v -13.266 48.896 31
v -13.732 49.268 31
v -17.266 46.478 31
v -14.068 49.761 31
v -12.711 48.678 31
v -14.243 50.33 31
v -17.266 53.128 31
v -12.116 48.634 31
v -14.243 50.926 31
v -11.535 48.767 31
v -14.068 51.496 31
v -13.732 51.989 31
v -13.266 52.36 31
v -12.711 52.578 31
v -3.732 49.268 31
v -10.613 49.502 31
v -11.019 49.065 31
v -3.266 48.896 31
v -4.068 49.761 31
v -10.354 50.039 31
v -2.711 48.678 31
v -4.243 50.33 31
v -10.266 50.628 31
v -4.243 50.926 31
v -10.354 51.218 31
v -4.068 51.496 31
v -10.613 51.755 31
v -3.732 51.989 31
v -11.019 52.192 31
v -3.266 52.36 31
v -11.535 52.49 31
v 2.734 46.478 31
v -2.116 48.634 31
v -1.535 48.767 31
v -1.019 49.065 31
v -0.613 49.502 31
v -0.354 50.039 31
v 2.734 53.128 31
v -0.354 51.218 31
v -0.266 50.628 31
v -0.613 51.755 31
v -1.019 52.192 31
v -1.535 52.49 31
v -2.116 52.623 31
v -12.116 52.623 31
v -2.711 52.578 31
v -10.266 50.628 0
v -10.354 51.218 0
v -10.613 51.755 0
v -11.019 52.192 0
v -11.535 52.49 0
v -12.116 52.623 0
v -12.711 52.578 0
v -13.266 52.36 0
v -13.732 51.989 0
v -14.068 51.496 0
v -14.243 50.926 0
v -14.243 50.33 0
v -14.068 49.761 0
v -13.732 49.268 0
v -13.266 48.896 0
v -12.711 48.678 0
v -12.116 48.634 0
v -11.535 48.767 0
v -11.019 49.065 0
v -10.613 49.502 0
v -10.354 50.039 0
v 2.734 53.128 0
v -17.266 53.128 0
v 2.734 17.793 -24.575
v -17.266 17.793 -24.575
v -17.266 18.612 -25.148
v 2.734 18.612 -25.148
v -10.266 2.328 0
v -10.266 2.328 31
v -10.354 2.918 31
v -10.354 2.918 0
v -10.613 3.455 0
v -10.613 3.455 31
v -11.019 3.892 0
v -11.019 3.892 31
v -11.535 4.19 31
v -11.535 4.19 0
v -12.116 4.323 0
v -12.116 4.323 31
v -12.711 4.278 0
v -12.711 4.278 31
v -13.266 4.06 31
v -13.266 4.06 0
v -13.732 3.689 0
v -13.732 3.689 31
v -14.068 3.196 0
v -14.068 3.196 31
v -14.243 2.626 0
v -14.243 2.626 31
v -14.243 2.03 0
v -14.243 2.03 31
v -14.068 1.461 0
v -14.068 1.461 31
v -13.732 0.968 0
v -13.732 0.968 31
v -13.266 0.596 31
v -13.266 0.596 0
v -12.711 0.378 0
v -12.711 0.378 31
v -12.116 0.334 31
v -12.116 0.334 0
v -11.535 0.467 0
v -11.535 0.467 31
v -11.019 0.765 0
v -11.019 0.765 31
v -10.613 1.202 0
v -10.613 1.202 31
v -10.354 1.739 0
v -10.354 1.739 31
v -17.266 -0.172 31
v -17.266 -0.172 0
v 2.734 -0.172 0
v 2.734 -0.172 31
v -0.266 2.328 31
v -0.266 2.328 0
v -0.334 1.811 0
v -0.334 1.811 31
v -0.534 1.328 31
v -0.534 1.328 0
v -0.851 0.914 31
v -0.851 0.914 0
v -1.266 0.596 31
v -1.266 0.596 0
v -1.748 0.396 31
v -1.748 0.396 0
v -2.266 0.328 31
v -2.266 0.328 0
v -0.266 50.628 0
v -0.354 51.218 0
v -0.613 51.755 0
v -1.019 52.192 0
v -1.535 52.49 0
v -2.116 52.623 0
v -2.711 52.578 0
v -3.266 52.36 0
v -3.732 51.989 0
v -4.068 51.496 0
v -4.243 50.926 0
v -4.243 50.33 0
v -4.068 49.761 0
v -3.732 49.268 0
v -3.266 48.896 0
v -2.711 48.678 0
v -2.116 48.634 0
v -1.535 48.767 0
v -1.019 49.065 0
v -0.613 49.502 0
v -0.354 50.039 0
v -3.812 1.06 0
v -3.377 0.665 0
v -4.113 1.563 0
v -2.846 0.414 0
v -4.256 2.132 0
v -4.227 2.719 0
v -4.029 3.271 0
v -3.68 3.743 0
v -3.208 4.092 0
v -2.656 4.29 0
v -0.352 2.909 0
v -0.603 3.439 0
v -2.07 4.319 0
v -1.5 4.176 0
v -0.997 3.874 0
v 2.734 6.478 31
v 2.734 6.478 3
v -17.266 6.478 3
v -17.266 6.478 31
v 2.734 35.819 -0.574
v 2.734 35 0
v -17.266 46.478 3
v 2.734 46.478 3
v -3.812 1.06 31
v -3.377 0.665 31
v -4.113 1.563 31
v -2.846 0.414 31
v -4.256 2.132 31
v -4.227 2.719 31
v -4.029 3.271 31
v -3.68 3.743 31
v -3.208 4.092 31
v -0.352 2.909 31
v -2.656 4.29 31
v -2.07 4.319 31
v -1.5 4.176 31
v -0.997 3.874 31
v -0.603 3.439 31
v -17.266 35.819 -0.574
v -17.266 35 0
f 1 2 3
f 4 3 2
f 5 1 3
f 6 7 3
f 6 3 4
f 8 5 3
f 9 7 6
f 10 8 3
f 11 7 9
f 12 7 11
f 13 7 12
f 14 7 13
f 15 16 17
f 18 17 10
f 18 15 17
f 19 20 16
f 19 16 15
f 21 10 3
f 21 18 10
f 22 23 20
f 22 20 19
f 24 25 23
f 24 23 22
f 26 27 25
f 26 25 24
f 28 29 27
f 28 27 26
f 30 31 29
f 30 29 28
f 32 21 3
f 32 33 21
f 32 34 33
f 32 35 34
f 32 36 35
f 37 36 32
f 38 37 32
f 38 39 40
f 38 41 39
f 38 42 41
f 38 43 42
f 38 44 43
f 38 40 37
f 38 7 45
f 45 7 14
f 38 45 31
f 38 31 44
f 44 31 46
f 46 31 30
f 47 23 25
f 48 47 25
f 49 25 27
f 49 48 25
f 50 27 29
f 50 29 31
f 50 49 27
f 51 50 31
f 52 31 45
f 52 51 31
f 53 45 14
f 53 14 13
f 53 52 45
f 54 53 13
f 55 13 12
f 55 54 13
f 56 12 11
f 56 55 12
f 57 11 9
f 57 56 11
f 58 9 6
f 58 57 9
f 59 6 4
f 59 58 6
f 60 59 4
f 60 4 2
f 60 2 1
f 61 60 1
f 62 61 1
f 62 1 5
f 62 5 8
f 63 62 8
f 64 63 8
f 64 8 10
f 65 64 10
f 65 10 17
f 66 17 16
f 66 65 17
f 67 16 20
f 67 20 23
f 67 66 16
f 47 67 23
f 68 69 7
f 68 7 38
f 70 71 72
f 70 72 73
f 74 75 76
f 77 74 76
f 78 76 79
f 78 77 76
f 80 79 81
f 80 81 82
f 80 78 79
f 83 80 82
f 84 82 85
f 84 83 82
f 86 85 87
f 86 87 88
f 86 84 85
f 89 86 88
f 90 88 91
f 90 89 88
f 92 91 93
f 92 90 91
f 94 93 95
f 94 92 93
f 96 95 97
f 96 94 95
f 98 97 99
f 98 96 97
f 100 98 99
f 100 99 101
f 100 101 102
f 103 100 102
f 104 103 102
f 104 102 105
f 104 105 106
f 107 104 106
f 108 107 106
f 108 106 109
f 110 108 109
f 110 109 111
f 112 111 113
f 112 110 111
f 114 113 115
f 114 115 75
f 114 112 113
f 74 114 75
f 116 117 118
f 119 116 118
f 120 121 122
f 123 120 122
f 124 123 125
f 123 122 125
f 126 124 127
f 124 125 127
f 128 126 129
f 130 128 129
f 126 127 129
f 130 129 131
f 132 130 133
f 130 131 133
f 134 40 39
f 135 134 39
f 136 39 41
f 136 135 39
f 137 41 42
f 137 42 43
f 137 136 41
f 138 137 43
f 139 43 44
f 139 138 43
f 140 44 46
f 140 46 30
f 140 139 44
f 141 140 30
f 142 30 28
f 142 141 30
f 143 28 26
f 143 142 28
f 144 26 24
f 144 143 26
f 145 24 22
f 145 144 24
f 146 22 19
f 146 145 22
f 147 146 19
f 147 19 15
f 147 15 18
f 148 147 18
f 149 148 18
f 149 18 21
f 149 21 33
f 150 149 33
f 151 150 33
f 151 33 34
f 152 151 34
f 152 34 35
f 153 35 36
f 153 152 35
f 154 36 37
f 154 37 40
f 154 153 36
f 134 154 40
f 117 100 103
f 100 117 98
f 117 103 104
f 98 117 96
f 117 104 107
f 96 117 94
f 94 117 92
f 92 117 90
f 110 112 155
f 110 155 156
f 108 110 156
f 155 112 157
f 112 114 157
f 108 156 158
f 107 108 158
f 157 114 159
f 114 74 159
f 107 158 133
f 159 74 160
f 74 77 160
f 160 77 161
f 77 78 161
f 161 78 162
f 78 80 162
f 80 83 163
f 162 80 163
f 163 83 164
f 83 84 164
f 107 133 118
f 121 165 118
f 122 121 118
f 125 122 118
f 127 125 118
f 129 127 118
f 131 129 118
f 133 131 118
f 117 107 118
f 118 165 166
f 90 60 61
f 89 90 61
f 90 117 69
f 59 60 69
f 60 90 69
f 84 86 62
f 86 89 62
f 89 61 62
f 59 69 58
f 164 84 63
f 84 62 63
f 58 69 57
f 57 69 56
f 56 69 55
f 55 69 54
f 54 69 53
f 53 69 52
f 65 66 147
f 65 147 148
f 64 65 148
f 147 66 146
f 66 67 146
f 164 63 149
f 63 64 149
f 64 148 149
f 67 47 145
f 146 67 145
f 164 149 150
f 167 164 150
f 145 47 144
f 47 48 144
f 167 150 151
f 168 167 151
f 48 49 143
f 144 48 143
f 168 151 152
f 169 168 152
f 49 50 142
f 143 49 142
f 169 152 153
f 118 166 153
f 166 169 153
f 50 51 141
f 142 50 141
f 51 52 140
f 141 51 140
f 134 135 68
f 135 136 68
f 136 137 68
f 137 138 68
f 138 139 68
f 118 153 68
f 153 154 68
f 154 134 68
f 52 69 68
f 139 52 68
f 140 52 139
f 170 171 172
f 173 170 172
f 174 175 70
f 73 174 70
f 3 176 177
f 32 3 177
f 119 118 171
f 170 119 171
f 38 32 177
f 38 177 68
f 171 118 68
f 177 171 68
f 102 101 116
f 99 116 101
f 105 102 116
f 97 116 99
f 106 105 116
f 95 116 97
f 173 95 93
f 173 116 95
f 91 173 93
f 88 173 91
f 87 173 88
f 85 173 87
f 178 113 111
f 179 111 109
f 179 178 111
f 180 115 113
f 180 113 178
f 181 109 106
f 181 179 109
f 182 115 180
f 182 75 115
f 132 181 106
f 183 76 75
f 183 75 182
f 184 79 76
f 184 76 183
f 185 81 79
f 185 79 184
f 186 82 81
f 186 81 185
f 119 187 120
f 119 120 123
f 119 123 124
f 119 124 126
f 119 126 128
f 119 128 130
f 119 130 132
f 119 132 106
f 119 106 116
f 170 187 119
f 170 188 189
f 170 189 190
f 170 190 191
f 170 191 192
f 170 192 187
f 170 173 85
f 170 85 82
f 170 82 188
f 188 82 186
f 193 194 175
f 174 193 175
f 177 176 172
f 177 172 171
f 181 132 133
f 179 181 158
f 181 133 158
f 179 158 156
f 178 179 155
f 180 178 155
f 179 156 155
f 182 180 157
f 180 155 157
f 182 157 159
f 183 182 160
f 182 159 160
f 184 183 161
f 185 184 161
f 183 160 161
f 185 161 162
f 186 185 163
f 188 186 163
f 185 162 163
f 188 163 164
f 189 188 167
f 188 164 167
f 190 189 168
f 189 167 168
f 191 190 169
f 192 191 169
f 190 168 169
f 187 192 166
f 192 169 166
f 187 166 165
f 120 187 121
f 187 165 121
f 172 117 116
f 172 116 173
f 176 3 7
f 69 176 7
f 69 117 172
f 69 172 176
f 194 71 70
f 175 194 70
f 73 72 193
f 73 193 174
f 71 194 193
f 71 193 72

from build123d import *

# Parameters (mm, degrees)
SKETCH3_W           = 20
SKETCH3_H           = 40
BOSS_EXTRUDE1_DEPTH = 3
SKETCH3_3_W         = 20
SKETCH3_3_H         = 6.65
SKETCH3_3_R         = 2
BOSS_EXTRUDE2_DEPTH = 31
SKETCH8_W           = 20
SKETCH8_H           = 30
BOSS_EXTRUDE6_DEPTH = 1


with BuildPart() as part:
    # Sketch3 → Boss-Extrude1 (new body)
    with BuildSketch(Plane.XY):
        with Locations((-7.265593176, 26.478335221)):
            Rectangle(SKETCH3_W, SKETCH3_H)
    extrude(amount=BOSS_EXTRUDE1_DEPTH)

    # Sketch3<3> → Boss-Extrude2 (add)
    # profile 1 of 2: a face of its own
    with BuildSketch(Plane.XY):
        with Locations((-7.265593176, 3.153335221)):
            Rectangle(SKETCH3_3_W, SKETCH3_3_H)
        with Locations((-2.265593176, 2.328335221)):
            Circle(SKETCH3_3_R, mode=Mode.SUBTRACT)
        with Locations((-12.265593176, 2.328335221)):
            Circle(SKETCH3_3_R, mode=Mode.SUBTRACT)
    # profile 2 of 2: a face of its own
    with BuildSketch(Plane.XY):
        with Locations((-7.265593176, 49.803335221)):
            Rectangle(SKETCH3_3_W, SKETCH3_3_H)
        with Locations((-12.265593176, 50.628335221)):
            Circle(SKETCH3_3_R, mode=Mode.SUBTRACT)
        with Locations((-2.265593176, 50.628335221)):
            Circle(SKETCH3_3_R, mode=Mode.SUBTRACT)
    extrude(amount=BOSS_EXTRUDE2_DEPTH)


with BuildPart() as body_2:
    # Sketch8 → Boss-Extrude6 (new body)
    with BuildSketch(Plane(origin=(0, 23.485352508, -16.444620864), x_dir=(1, 0, 0), z_dir=(0, 0.819152044288991, -0.5735764363510473))):
        with Locations((-7.265593176, -5.075175272)):
            Rectangle(SKETCH8_W, SKETCH8_H)
    extrude(amount=BOSS_EXTRUDE6_DEPTH)


solid = Compound([part.part, body_2.part])
